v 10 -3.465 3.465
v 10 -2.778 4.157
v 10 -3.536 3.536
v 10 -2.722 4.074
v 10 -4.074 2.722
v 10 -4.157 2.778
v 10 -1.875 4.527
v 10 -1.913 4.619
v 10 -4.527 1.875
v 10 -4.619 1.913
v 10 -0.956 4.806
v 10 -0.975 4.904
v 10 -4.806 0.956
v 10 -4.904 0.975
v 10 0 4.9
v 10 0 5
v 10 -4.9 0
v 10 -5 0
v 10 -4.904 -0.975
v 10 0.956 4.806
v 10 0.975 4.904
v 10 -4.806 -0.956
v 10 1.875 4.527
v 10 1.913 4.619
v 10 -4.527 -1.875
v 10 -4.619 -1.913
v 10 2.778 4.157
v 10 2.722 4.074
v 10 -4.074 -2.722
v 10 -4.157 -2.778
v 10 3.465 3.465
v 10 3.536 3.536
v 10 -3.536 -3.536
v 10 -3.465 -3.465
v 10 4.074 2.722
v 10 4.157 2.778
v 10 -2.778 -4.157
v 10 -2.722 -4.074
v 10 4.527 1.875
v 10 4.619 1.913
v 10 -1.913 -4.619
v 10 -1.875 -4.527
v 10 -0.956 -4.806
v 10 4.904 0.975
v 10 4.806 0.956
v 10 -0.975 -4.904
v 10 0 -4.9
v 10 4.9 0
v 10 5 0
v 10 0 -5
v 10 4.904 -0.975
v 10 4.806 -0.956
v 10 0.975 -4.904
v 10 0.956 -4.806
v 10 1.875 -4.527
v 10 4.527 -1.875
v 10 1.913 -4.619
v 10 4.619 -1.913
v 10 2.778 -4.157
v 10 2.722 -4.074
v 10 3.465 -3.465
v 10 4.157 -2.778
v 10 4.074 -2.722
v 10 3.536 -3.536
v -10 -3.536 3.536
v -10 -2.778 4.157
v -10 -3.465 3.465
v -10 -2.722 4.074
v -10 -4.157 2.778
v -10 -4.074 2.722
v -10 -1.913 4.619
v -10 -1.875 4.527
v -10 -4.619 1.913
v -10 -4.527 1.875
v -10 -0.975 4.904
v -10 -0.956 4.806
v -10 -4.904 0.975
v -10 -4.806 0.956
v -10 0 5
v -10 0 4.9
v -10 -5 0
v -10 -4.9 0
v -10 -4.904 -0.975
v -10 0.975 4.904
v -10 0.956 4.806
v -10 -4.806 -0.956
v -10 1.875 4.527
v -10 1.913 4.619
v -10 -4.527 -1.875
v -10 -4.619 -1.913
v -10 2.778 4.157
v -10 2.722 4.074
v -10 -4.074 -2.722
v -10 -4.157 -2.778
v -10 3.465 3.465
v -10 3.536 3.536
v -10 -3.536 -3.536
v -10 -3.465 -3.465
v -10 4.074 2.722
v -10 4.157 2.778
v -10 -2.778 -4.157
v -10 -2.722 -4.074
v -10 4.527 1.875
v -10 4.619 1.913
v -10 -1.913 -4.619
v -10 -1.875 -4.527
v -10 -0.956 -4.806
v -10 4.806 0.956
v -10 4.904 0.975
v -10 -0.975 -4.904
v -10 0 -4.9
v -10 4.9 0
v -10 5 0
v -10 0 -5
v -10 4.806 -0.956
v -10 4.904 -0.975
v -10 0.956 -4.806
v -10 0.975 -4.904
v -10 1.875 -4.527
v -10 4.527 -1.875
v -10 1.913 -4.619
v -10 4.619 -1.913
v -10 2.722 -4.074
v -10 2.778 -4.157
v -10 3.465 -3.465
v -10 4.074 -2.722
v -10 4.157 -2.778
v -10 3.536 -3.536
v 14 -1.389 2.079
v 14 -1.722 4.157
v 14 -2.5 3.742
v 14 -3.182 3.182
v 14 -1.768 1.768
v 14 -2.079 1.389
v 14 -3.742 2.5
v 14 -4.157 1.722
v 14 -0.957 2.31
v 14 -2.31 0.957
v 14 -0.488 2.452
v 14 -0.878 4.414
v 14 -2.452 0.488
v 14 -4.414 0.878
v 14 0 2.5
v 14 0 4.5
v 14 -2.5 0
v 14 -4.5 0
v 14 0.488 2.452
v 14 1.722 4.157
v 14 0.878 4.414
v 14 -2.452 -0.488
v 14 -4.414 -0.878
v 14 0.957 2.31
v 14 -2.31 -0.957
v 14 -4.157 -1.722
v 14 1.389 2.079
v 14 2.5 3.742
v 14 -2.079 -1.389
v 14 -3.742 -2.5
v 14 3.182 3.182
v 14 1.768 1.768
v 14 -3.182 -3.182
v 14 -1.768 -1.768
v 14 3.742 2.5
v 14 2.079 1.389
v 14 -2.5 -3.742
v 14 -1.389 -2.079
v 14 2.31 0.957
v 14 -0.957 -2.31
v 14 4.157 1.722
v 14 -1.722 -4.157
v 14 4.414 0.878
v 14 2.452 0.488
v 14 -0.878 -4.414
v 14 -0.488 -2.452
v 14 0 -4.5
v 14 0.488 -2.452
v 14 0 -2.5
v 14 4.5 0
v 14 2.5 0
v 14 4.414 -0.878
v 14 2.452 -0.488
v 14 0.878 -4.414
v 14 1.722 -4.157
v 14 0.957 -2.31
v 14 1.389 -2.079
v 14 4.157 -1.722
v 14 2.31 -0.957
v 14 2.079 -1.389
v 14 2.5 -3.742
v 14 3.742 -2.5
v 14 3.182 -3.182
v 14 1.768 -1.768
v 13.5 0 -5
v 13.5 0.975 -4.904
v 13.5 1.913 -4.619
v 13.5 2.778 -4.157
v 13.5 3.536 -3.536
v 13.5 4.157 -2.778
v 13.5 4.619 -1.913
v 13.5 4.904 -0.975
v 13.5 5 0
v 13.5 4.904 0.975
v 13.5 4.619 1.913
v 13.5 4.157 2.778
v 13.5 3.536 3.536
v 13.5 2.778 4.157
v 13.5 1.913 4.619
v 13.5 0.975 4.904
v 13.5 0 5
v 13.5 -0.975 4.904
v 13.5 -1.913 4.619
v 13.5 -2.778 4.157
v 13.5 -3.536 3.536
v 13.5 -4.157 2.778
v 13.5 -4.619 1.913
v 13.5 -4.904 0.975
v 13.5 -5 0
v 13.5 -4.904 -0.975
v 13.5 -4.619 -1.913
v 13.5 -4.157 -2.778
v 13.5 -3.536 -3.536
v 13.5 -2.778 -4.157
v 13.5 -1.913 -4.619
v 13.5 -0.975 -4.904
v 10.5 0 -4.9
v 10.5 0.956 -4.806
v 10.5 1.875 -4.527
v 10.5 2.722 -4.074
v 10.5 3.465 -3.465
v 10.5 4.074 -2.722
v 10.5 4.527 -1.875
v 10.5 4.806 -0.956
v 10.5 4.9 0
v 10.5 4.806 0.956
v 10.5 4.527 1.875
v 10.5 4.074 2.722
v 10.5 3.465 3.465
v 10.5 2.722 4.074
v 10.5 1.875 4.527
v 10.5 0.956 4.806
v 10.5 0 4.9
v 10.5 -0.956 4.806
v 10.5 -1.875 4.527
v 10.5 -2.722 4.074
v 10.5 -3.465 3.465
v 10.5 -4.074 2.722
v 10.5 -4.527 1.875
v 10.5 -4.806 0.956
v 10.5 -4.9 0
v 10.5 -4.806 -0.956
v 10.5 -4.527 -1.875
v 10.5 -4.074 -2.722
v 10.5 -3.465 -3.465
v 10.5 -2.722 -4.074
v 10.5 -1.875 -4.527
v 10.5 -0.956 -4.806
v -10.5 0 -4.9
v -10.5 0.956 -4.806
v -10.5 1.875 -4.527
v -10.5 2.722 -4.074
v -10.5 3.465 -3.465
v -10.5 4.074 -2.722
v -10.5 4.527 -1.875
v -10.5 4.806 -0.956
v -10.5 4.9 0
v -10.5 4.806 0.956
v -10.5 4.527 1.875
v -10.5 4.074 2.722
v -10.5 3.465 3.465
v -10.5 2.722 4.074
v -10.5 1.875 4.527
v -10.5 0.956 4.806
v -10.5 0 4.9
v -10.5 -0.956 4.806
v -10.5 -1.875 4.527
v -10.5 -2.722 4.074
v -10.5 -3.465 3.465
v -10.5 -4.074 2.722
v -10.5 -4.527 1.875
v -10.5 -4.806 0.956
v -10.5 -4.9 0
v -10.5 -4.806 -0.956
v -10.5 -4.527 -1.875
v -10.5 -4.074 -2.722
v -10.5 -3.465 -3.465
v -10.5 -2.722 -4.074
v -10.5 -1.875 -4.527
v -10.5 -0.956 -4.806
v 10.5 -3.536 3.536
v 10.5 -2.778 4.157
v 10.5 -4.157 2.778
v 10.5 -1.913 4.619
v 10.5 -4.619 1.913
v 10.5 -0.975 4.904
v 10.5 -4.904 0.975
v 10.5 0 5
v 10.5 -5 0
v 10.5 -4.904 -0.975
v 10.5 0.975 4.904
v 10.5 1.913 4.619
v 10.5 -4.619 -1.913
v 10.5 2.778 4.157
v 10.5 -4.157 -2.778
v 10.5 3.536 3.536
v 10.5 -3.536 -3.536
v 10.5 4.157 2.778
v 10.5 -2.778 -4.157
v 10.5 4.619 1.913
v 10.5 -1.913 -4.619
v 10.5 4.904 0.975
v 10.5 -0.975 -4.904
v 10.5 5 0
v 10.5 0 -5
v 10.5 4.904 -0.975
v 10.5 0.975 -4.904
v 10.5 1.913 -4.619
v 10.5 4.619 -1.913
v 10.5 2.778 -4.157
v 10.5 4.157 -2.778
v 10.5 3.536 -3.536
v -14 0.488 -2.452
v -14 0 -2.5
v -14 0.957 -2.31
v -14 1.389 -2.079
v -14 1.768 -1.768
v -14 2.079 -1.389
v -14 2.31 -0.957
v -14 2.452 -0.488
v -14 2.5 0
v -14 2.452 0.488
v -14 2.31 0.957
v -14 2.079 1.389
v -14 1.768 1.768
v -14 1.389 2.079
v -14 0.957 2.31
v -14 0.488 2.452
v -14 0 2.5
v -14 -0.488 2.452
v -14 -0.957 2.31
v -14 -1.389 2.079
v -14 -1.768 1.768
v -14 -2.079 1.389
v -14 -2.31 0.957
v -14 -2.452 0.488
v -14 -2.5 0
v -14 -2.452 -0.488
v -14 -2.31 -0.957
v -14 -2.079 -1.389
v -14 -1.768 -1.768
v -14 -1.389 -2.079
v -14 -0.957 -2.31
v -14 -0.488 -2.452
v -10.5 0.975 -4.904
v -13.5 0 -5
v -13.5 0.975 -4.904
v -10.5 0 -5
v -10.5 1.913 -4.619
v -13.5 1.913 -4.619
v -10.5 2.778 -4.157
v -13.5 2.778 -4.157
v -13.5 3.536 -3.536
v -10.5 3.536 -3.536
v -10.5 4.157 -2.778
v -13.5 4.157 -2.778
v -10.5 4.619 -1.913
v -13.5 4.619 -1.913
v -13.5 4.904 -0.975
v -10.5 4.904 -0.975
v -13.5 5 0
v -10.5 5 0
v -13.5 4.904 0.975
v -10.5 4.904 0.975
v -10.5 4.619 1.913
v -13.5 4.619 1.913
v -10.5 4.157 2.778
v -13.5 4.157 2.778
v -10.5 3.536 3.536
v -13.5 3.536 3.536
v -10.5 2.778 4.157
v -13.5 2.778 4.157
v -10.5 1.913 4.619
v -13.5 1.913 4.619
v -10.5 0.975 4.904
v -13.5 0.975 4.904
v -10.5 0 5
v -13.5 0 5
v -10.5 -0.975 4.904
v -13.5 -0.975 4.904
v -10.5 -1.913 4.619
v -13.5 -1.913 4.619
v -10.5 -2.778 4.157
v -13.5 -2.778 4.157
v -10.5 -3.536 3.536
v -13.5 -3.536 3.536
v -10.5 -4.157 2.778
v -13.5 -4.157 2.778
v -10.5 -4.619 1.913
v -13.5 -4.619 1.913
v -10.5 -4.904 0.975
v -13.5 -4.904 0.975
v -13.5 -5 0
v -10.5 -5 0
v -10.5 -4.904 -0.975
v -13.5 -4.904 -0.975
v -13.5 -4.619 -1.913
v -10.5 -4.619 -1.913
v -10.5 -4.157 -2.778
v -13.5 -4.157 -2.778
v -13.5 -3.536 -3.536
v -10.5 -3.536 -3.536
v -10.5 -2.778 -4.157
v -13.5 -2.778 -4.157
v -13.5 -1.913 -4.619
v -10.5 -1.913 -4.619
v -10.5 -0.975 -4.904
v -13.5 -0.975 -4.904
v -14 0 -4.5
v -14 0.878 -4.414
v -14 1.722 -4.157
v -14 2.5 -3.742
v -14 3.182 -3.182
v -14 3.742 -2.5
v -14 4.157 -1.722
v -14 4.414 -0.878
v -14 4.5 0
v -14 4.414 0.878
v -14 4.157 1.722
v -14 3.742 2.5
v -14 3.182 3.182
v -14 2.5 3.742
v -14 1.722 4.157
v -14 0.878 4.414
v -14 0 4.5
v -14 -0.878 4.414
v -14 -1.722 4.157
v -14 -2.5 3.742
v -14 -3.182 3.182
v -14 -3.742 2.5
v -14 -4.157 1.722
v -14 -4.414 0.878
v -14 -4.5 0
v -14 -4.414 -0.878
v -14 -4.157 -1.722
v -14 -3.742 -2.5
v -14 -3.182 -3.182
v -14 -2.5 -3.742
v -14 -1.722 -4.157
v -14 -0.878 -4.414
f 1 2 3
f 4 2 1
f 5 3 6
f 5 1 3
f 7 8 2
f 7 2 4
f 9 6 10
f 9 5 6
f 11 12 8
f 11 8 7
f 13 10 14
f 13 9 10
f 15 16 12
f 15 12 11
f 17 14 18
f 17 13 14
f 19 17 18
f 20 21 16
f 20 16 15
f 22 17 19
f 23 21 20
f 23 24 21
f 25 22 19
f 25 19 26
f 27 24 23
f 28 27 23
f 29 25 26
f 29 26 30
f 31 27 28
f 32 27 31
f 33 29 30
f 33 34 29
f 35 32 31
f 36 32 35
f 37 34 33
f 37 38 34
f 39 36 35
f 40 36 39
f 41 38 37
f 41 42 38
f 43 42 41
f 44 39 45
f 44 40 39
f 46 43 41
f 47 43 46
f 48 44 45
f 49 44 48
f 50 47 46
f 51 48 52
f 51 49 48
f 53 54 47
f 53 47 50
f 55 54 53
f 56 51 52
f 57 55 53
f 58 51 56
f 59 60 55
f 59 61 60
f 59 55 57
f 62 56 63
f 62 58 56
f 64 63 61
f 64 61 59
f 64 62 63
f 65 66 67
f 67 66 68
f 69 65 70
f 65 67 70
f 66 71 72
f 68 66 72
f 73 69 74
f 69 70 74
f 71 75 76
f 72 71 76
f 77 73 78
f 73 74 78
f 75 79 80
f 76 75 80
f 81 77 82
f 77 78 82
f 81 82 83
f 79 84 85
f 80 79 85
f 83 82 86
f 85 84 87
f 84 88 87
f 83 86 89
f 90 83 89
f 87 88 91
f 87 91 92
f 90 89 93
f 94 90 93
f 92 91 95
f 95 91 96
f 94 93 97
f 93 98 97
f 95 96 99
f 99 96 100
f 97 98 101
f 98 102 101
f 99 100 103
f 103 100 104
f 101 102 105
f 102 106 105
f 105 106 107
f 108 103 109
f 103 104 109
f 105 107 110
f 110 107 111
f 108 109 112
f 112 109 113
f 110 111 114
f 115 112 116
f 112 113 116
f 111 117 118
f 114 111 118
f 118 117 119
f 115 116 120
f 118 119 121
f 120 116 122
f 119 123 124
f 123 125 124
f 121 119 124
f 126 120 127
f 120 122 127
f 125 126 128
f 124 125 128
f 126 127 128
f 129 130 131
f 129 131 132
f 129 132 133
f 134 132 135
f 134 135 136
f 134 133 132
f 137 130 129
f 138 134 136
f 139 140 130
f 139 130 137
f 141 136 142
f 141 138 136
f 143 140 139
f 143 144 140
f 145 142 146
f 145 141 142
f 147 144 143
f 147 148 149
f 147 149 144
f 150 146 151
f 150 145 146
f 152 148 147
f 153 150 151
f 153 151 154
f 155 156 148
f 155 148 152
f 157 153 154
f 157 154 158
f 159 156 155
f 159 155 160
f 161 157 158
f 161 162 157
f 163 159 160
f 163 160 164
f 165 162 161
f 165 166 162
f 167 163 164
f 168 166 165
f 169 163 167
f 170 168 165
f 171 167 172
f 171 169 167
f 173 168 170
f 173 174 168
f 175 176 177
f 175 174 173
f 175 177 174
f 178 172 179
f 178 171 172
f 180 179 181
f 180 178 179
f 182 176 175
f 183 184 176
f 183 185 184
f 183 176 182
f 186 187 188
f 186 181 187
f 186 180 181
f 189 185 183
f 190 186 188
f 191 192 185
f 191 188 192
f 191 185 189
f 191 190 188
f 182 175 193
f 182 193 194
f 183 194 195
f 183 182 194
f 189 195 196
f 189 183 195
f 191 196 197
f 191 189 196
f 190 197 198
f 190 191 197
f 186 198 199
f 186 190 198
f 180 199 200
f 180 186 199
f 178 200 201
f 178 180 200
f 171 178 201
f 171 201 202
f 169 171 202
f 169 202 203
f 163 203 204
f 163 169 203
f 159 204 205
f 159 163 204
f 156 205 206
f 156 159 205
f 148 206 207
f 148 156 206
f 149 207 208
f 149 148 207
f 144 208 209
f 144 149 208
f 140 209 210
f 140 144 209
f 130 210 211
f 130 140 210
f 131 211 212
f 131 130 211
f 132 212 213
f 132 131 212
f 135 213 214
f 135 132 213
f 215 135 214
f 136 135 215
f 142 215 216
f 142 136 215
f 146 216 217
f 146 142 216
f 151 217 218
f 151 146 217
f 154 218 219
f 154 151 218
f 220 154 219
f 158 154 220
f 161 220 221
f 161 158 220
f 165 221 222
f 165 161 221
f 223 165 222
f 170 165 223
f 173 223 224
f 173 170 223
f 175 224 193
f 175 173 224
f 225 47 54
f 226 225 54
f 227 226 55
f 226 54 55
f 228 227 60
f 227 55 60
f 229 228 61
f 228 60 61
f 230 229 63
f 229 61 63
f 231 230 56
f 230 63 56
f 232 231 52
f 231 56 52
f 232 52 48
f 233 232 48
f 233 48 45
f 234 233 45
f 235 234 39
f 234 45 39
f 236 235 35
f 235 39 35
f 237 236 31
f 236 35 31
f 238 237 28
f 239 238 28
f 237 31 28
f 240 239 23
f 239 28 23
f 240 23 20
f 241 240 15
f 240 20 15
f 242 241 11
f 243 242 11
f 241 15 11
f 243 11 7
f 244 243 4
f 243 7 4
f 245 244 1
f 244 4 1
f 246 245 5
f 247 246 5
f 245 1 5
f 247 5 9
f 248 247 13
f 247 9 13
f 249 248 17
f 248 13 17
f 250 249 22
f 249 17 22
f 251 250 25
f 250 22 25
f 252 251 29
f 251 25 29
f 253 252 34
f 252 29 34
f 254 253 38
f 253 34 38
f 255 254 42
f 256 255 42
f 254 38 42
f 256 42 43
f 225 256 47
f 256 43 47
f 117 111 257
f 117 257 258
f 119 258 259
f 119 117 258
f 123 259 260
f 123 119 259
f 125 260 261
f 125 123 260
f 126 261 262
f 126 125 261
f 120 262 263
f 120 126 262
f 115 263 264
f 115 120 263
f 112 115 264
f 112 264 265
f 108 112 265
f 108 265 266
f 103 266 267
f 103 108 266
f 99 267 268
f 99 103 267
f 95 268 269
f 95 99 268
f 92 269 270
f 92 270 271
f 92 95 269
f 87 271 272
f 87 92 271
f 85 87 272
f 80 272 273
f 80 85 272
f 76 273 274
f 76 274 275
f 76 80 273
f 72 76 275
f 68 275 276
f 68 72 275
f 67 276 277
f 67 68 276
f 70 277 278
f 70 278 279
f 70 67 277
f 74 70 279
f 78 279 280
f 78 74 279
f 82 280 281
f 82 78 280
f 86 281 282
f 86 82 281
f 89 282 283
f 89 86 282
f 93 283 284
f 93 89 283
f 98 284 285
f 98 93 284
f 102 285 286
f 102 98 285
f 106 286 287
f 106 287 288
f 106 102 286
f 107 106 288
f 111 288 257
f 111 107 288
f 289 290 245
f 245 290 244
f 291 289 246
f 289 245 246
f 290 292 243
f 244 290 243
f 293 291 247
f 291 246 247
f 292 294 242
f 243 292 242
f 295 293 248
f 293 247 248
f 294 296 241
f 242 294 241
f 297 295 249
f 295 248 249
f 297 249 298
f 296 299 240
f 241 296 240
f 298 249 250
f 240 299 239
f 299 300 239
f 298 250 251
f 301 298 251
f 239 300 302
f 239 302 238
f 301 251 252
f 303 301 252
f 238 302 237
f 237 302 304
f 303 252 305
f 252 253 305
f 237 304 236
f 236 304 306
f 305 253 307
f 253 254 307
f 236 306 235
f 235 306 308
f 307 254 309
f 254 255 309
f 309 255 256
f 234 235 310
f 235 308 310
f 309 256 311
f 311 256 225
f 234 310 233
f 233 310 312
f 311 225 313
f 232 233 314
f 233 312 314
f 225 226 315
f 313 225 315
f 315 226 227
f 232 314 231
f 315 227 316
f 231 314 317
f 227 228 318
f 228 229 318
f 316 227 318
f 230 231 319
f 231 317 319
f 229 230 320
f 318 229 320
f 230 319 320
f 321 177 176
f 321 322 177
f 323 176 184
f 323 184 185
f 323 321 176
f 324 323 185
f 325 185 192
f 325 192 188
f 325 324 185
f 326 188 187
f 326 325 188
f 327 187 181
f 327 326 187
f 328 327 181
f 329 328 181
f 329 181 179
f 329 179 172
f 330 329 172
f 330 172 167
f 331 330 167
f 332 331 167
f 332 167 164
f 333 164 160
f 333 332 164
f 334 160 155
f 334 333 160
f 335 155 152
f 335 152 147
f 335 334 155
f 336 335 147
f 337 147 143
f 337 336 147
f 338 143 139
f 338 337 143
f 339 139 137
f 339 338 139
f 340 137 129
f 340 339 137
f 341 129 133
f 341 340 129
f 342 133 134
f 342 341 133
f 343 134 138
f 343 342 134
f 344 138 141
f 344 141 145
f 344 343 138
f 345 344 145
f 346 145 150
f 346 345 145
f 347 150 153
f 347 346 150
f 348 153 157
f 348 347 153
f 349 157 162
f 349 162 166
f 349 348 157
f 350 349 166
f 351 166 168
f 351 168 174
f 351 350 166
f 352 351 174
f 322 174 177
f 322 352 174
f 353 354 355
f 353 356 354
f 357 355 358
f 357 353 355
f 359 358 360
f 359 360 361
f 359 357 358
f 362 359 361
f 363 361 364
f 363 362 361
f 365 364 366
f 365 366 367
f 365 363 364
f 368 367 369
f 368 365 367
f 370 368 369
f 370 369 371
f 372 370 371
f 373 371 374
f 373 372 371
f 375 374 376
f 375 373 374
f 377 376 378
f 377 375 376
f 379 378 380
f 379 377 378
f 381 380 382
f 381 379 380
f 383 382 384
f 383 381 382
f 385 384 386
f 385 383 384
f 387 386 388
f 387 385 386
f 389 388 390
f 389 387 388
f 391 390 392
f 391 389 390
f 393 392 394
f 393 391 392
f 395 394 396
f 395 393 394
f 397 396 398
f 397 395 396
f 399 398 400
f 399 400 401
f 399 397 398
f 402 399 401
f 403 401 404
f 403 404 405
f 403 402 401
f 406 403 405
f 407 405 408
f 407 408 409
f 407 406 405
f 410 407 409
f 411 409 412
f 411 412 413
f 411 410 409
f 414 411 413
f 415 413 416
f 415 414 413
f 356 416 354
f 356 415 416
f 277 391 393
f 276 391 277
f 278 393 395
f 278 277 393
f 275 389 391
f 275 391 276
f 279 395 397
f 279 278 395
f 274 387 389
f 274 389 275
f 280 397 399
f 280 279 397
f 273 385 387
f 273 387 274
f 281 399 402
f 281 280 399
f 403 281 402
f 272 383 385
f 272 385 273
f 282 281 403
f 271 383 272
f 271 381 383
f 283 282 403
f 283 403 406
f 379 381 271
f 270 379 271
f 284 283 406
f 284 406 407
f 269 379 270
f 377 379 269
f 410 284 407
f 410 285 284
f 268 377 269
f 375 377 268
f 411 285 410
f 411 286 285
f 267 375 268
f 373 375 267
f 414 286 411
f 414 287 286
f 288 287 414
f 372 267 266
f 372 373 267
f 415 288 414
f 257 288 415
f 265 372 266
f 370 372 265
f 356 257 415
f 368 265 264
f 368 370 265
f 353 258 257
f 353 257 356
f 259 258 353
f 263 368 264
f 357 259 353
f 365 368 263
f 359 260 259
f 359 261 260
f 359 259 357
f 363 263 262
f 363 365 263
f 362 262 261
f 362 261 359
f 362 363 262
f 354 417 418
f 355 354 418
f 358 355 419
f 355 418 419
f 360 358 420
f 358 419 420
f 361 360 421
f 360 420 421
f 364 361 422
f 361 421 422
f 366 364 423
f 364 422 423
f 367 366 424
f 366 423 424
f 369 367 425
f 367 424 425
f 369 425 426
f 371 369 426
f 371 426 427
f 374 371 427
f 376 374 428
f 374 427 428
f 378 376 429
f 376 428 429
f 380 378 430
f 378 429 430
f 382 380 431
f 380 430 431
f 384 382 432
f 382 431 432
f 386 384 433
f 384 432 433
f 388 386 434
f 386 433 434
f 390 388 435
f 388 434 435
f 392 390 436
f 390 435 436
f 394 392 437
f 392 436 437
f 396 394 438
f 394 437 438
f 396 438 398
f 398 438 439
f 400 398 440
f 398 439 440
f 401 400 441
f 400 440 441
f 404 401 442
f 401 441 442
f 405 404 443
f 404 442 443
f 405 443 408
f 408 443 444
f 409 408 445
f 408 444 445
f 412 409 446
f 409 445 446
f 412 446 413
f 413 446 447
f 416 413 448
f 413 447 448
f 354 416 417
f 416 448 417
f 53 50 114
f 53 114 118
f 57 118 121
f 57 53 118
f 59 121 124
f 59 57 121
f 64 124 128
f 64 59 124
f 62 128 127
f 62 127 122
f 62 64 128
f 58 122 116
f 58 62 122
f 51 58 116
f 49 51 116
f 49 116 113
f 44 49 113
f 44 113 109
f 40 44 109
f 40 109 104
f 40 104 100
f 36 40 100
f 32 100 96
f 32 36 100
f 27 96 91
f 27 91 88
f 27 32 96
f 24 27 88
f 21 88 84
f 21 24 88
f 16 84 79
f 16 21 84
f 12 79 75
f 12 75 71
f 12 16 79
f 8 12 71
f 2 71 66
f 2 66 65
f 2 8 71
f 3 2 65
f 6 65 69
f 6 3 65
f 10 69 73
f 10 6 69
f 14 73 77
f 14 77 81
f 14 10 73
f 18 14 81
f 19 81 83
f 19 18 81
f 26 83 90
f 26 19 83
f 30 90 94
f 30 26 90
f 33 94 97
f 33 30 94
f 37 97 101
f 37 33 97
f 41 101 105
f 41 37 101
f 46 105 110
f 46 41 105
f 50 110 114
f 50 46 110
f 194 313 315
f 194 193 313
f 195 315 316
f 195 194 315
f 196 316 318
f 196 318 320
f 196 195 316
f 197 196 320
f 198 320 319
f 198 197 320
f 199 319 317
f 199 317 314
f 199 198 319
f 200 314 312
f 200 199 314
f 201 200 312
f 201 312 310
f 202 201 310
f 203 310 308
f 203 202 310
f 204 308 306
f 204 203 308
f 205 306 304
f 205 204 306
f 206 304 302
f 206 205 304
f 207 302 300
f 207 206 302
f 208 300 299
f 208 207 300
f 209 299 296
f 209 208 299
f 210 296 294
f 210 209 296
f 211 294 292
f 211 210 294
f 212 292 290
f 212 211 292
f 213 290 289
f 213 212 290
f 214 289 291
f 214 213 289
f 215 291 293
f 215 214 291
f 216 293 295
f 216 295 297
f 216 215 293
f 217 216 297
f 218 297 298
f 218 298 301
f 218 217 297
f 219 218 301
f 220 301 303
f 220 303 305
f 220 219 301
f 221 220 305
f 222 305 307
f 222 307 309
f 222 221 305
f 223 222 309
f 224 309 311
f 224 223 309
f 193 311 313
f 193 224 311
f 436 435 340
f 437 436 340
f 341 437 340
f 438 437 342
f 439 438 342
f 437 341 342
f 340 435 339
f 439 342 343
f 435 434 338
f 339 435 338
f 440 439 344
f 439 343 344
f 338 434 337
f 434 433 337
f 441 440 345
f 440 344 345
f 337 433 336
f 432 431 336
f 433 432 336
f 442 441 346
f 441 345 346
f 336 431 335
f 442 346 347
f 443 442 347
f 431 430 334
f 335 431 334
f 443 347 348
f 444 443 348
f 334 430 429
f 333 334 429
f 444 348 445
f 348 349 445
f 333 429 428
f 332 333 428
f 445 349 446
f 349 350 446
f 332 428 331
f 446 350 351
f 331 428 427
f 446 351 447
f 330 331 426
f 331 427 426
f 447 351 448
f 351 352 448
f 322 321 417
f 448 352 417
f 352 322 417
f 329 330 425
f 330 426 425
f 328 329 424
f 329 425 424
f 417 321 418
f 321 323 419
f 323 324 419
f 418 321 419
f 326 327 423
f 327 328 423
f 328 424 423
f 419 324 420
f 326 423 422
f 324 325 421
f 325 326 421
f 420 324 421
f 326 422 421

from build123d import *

# Parameters (mm, degrees)
SKETCH_1_R          = 5
SKETCH_1_R_2        = 2.5
EXTRUDE_1_DEPTH     = 14
CHAMFER_1_SIZE      = 0.5
CUT_EXTRUDE_START   = -10
SKETCH_3_OUTSIDE_W  = 18.274
SKETCH_3_OUTSIDE_H  = 18.274
SKETCH_3_OUTSIDE_R  = 4.9
CUT_EXTRUDE_1_DEPTH = 0.5


with BuildPart() as part:
    # 草图1 → 凸台-拉伸1 (new, symmetric)
    with BuildSketch(Plane(origin=(0, 0, 0), x_dir=(0, 0, -1), z_dir=(1, 0, 0))):
        Circle(SKETCH_1_R)
        Circle(SKETCH_1_R_2, mode=Mode.SUBTRACT)
    extrude(amount=EXTRUDE_1_DEPTH, both=True)

    # 倒角1
    chamfer_1_edges = [part.edges().sort_by_distance(p)[0] for p in [
        (-14, 0, 5),
        (14, 0, 5),
    ]]
    chamfer(chamfer_1_edges, length=CHAMFER_1_SIZE)

    # 草图3 outside → 切除-拉伸1 (cut)
    with BuildSketch(Plane(origin=(0, 0, 0), x_dir=(0, 0, -1), z_dir=(1, 0, 0)).offset(CUT_EXTRUDE_START)):
        Rectangle(SKETCH_3_OUTSIDE_W, SKETCH_3_OUTSIDE_H)
        Circle(SKETCH_3_OUTSIDE_R, mode=Mode.SUBTRACT)
    cut_extrude_1 = extrude(amount=-CUT_EXTRUDE_1_DEPTH, mode=Mode.SUBTRACT)

    # 镜向1: 切除-拉伸1 across plane
    add(cut_extrude_1.mirror(Plane(origin=(0, 0, 0), x_dir=(0, 0, 1), z_dir=(1, 0, 0))), mode=Mode.SUBTRACT)


solid = part.part
